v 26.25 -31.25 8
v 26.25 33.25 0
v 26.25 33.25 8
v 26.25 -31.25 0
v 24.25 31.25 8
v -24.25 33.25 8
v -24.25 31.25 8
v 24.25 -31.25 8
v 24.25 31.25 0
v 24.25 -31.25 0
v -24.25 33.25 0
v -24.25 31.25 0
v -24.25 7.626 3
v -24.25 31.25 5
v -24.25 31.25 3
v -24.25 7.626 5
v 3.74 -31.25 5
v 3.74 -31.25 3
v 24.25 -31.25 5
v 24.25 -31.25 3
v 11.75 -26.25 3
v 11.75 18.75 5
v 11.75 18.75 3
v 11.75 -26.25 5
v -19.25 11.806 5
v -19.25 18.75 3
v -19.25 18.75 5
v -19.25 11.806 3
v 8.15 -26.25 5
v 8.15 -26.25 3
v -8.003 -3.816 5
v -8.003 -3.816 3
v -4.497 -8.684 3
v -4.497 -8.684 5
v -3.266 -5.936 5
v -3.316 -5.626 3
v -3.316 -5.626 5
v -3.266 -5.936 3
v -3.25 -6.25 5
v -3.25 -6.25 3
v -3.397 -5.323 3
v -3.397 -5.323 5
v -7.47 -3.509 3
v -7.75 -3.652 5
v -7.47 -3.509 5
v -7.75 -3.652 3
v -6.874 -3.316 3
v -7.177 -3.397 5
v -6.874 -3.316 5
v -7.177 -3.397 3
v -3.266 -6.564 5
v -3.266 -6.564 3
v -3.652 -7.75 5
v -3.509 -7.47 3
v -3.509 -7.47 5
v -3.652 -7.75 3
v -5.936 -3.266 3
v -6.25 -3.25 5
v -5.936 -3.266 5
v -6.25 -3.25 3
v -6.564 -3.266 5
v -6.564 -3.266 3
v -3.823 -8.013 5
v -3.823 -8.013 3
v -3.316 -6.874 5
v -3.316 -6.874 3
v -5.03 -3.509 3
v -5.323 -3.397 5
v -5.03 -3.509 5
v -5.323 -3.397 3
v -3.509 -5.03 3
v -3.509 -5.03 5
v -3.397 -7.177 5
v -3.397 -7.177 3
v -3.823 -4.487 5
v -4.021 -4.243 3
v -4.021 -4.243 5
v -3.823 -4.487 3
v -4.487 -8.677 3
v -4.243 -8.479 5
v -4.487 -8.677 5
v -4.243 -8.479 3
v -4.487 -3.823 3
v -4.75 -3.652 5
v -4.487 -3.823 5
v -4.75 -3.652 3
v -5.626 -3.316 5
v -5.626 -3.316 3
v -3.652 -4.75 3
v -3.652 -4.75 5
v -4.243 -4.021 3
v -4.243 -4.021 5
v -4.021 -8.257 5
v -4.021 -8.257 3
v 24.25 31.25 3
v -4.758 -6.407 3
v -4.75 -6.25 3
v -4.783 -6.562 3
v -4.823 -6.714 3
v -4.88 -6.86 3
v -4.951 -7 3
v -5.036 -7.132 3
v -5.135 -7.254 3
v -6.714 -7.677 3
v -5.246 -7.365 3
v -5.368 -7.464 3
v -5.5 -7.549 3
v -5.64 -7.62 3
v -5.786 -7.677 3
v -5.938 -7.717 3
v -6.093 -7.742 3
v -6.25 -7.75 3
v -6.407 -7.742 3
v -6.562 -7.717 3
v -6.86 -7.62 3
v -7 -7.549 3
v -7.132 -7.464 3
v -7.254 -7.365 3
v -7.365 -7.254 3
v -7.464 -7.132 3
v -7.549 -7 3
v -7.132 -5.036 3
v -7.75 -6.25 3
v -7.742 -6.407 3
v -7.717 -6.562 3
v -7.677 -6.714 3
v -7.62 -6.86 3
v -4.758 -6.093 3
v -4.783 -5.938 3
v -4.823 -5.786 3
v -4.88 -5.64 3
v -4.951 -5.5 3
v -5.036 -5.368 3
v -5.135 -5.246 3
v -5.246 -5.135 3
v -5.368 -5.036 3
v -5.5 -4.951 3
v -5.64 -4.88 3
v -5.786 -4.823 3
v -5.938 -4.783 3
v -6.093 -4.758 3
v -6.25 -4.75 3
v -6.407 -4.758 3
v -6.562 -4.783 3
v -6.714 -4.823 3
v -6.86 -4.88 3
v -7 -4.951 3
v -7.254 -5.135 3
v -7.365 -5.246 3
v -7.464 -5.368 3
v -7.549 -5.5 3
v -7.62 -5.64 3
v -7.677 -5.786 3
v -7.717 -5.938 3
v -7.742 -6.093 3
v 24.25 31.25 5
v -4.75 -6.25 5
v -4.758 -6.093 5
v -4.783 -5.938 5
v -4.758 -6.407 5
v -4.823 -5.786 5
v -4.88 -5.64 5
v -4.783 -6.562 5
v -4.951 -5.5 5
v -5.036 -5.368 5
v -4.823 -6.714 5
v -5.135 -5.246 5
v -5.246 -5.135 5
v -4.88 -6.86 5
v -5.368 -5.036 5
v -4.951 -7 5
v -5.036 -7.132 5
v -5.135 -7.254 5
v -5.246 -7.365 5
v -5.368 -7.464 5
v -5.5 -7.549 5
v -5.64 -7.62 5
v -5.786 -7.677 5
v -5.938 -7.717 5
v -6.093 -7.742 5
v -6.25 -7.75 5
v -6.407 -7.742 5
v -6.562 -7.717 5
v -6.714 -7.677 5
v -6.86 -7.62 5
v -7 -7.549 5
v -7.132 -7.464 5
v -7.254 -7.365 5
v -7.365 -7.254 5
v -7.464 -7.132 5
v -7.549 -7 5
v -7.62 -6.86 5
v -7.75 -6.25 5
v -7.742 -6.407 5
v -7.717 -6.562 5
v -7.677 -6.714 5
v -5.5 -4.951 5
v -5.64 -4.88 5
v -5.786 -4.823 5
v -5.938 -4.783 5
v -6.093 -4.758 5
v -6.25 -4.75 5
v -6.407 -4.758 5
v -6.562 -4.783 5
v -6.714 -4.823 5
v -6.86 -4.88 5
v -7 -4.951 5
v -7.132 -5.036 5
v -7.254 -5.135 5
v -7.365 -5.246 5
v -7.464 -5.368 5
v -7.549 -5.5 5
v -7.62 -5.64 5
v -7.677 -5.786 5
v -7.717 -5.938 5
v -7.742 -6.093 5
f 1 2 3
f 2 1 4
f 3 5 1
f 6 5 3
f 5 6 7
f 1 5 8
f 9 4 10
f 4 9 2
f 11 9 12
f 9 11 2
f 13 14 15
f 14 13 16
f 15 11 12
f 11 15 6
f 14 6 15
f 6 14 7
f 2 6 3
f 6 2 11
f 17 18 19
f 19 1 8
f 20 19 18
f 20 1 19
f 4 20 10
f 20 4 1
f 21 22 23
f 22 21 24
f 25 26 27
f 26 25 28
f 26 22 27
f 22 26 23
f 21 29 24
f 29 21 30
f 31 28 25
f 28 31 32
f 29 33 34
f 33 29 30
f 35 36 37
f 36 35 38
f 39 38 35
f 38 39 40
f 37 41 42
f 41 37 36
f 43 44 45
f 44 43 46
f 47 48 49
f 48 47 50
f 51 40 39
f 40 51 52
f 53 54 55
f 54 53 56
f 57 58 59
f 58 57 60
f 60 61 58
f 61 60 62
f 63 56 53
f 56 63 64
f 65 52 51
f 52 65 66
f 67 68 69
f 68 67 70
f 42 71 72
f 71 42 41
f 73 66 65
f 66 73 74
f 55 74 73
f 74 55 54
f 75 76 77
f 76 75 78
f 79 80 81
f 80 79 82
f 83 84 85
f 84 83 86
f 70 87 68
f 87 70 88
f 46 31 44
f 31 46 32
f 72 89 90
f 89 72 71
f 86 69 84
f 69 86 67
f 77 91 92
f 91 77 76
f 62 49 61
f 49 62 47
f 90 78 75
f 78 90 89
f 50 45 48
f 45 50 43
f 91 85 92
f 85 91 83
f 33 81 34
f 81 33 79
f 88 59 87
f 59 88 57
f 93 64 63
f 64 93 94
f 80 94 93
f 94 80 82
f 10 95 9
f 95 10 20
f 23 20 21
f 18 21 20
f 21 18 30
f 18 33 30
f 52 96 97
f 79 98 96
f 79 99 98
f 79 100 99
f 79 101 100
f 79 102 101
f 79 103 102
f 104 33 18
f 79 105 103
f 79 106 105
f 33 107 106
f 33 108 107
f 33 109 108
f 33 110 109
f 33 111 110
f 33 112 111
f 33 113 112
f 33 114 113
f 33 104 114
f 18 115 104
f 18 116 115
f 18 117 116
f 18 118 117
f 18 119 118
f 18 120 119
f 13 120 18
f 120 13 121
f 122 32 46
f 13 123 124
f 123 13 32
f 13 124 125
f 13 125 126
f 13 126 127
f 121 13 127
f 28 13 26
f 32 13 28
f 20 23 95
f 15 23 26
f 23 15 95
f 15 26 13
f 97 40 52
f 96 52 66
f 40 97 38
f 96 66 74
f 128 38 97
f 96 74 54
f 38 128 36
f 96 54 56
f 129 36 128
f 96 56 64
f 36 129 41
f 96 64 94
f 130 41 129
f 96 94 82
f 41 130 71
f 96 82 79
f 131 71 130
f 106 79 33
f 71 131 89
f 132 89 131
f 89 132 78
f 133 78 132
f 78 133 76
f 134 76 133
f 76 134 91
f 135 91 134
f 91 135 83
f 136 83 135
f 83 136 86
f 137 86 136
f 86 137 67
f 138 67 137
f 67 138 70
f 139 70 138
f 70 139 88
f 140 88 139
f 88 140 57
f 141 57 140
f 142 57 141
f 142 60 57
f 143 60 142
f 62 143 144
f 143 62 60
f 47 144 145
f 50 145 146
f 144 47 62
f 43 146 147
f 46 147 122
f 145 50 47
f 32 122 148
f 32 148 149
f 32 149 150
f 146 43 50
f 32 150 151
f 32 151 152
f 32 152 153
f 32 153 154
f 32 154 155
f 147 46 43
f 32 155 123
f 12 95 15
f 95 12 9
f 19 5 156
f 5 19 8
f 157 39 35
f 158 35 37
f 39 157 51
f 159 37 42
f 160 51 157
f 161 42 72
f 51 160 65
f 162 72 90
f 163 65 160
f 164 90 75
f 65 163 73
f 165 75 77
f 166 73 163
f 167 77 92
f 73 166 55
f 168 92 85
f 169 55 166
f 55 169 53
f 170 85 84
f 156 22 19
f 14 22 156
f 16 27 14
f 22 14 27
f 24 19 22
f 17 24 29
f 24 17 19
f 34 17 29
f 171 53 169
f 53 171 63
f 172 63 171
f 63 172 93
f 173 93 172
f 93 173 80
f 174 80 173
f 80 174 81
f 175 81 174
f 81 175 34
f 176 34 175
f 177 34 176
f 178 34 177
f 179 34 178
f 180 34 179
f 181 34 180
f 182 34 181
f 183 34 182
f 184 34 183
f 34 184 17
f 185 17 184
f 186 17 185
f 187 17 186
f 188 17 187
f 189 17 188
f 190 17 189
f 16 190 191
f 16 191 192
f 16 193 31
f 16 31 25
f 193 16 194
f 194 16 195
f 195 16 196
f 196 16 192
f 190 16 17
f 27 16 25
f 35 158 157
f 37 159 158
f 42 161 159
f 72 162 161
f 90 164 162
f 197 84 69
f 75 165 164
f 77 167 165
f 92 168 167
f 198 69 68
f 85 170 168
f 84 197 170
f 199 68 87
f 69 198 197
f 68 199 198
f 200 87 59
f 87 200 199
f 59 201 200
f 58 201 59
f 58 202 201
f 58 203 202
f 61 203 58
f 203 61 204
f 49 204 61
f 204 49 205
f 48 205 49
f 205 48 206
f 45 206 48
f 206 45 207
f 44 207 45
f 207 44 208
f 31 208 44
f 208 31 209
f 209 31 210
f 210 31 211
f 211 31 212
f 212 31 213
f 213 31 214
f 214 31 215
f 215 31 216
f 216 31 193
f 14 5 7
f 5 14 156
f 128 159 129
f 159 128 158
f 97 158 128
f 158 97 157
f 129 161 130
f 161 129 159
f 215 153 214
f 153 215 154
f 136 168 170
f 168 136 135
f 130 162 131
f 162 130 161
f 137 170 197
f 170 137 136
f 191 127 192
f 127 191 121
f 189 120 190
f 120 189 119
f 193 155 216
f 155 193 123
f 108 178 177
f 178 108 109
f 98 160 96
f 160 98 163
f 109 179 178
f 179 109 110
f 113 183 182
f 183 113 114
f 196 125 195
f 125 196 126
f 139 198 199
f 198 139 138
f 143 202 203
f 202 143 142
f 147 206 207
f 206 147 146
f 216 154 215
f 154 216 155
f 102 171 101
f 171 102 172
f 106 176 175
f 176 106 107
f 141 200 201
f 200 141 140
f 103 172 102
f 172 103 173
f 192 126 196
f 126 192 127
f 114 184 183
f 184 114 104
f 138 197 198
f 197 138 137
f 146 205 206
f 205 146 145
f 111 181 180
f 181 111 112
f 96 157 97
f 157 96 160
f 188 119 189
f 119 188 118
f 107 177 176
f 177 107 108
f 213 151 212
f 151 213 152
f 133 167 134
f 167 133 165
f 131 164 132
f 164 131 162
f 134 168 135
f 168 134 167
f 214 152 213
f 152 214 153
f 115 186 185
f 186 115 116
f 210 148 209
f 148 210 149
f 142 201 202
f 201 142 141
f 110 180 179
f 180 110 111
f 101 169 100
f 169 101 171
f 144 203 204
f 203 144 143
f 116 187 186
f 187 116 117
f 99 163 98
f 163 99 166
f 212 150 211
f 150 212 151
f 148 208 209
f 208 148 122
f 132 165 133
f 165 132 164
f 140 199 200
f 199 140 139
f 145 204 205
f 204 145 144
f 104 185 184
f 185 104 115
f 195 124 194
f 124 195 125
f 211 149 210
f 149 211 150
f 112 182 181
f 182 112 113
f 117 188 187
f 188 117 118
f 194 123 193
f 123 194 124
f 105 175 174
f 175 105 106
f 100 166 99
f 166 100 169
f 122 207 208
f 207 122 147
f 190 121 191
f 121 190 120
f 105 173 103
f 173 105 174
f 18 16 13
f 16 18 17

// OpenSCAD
/*
 * Author:  Marcelo Costa Jr.
 * License: Creative Commons Attribution-ShareAlike 3.0 Unported License
 *          see http://creativecommons.org/licenses/by-sa/3.0/
 * URL:     http://www.thingiverse.com/thing:142382
 */

// MakerBot customizer settings:
// preview[view:south east, tilt:top diagonal]

/*
 * parameters
 */

/* [parameters] */
// spacing from edge of table on the X axes (mm)
	xEsp = 12.5; 
// spacing from edge of table on the Y axes (mm)
	yEsp = 12.5; 
// dimensions of leg on the X axes (mm)
	xLeg = 36;
// dimensions of leg on the Y axes (mm)	
	yLeg = 50;
// diameter of drilling hole (mm)
	hDia = 3;// [3:12]
	
/*[hidden]*/
	hRad = hDia/2;
// a little trigonometry
	alpha = atan2(yLeg,xLeg);
	dY = (hRad+5)/cos(alpha);
	dX = (hRad+5)/sin(alpha);

// quality of the circles
$fn=60;

// edge spacer
module spacer() {
	difference() {
		// full volume
		cube([xEsp+xLeg+2,yEsp+yLeg+2,8]);
		// subtration (leg)
		translate([5,5,-1])
			cube([xLeg-5,yLeg-5,10]);
	}
}

// transversal support of drill guide
module transversal() {
	difference (){
		translate([0,0,0])
			linear_extrude(height = 8, center = false, convexity = 10, twist = 0)
				polygon(points = [[0,0],[0,yLeg],[xLeg,0]]);
	}
}
// drill guide
module drill() {
	translate([xLeg/2,yLeg/2,0])
		cylinder(h=8, r=hDia);
}

//	cuts 
module cutUpDow(){
	// subtration (downer cut)
	translate([-1,-1,-1])
		cube([xEsp+xLeg+1,yEsp+yLeg+1,4]);
	// 2nd subtration (upper cut)
	translate([-1,-1,3+2])
		cube([xEsp+xLeg+1,yEsp+yLeg+1,4]); 

}
module cutSlant() {
	translate([0,0,0])
		linear_extrude(height = 10, center = false, convexity = 10, twist = 0)
			polygon(points = [[-1,-1],[0,yLeg-dY],[xLeg-dX,0]]);
}
module cutHole() {
	translate([xLeg/2,yLeg/2,-1])
		cylinder(h=10, r=hDia/2);
}

// The actual sequence of actions
translate([-(xLeg+xEsp)/2,-(yLeg+yEsp)/2,0])
	difference(){
		union(){
			spacer();
			transversal();
			drill();
		}
		cutHole();
		cutUpDow();
		cutSlant();
	}
